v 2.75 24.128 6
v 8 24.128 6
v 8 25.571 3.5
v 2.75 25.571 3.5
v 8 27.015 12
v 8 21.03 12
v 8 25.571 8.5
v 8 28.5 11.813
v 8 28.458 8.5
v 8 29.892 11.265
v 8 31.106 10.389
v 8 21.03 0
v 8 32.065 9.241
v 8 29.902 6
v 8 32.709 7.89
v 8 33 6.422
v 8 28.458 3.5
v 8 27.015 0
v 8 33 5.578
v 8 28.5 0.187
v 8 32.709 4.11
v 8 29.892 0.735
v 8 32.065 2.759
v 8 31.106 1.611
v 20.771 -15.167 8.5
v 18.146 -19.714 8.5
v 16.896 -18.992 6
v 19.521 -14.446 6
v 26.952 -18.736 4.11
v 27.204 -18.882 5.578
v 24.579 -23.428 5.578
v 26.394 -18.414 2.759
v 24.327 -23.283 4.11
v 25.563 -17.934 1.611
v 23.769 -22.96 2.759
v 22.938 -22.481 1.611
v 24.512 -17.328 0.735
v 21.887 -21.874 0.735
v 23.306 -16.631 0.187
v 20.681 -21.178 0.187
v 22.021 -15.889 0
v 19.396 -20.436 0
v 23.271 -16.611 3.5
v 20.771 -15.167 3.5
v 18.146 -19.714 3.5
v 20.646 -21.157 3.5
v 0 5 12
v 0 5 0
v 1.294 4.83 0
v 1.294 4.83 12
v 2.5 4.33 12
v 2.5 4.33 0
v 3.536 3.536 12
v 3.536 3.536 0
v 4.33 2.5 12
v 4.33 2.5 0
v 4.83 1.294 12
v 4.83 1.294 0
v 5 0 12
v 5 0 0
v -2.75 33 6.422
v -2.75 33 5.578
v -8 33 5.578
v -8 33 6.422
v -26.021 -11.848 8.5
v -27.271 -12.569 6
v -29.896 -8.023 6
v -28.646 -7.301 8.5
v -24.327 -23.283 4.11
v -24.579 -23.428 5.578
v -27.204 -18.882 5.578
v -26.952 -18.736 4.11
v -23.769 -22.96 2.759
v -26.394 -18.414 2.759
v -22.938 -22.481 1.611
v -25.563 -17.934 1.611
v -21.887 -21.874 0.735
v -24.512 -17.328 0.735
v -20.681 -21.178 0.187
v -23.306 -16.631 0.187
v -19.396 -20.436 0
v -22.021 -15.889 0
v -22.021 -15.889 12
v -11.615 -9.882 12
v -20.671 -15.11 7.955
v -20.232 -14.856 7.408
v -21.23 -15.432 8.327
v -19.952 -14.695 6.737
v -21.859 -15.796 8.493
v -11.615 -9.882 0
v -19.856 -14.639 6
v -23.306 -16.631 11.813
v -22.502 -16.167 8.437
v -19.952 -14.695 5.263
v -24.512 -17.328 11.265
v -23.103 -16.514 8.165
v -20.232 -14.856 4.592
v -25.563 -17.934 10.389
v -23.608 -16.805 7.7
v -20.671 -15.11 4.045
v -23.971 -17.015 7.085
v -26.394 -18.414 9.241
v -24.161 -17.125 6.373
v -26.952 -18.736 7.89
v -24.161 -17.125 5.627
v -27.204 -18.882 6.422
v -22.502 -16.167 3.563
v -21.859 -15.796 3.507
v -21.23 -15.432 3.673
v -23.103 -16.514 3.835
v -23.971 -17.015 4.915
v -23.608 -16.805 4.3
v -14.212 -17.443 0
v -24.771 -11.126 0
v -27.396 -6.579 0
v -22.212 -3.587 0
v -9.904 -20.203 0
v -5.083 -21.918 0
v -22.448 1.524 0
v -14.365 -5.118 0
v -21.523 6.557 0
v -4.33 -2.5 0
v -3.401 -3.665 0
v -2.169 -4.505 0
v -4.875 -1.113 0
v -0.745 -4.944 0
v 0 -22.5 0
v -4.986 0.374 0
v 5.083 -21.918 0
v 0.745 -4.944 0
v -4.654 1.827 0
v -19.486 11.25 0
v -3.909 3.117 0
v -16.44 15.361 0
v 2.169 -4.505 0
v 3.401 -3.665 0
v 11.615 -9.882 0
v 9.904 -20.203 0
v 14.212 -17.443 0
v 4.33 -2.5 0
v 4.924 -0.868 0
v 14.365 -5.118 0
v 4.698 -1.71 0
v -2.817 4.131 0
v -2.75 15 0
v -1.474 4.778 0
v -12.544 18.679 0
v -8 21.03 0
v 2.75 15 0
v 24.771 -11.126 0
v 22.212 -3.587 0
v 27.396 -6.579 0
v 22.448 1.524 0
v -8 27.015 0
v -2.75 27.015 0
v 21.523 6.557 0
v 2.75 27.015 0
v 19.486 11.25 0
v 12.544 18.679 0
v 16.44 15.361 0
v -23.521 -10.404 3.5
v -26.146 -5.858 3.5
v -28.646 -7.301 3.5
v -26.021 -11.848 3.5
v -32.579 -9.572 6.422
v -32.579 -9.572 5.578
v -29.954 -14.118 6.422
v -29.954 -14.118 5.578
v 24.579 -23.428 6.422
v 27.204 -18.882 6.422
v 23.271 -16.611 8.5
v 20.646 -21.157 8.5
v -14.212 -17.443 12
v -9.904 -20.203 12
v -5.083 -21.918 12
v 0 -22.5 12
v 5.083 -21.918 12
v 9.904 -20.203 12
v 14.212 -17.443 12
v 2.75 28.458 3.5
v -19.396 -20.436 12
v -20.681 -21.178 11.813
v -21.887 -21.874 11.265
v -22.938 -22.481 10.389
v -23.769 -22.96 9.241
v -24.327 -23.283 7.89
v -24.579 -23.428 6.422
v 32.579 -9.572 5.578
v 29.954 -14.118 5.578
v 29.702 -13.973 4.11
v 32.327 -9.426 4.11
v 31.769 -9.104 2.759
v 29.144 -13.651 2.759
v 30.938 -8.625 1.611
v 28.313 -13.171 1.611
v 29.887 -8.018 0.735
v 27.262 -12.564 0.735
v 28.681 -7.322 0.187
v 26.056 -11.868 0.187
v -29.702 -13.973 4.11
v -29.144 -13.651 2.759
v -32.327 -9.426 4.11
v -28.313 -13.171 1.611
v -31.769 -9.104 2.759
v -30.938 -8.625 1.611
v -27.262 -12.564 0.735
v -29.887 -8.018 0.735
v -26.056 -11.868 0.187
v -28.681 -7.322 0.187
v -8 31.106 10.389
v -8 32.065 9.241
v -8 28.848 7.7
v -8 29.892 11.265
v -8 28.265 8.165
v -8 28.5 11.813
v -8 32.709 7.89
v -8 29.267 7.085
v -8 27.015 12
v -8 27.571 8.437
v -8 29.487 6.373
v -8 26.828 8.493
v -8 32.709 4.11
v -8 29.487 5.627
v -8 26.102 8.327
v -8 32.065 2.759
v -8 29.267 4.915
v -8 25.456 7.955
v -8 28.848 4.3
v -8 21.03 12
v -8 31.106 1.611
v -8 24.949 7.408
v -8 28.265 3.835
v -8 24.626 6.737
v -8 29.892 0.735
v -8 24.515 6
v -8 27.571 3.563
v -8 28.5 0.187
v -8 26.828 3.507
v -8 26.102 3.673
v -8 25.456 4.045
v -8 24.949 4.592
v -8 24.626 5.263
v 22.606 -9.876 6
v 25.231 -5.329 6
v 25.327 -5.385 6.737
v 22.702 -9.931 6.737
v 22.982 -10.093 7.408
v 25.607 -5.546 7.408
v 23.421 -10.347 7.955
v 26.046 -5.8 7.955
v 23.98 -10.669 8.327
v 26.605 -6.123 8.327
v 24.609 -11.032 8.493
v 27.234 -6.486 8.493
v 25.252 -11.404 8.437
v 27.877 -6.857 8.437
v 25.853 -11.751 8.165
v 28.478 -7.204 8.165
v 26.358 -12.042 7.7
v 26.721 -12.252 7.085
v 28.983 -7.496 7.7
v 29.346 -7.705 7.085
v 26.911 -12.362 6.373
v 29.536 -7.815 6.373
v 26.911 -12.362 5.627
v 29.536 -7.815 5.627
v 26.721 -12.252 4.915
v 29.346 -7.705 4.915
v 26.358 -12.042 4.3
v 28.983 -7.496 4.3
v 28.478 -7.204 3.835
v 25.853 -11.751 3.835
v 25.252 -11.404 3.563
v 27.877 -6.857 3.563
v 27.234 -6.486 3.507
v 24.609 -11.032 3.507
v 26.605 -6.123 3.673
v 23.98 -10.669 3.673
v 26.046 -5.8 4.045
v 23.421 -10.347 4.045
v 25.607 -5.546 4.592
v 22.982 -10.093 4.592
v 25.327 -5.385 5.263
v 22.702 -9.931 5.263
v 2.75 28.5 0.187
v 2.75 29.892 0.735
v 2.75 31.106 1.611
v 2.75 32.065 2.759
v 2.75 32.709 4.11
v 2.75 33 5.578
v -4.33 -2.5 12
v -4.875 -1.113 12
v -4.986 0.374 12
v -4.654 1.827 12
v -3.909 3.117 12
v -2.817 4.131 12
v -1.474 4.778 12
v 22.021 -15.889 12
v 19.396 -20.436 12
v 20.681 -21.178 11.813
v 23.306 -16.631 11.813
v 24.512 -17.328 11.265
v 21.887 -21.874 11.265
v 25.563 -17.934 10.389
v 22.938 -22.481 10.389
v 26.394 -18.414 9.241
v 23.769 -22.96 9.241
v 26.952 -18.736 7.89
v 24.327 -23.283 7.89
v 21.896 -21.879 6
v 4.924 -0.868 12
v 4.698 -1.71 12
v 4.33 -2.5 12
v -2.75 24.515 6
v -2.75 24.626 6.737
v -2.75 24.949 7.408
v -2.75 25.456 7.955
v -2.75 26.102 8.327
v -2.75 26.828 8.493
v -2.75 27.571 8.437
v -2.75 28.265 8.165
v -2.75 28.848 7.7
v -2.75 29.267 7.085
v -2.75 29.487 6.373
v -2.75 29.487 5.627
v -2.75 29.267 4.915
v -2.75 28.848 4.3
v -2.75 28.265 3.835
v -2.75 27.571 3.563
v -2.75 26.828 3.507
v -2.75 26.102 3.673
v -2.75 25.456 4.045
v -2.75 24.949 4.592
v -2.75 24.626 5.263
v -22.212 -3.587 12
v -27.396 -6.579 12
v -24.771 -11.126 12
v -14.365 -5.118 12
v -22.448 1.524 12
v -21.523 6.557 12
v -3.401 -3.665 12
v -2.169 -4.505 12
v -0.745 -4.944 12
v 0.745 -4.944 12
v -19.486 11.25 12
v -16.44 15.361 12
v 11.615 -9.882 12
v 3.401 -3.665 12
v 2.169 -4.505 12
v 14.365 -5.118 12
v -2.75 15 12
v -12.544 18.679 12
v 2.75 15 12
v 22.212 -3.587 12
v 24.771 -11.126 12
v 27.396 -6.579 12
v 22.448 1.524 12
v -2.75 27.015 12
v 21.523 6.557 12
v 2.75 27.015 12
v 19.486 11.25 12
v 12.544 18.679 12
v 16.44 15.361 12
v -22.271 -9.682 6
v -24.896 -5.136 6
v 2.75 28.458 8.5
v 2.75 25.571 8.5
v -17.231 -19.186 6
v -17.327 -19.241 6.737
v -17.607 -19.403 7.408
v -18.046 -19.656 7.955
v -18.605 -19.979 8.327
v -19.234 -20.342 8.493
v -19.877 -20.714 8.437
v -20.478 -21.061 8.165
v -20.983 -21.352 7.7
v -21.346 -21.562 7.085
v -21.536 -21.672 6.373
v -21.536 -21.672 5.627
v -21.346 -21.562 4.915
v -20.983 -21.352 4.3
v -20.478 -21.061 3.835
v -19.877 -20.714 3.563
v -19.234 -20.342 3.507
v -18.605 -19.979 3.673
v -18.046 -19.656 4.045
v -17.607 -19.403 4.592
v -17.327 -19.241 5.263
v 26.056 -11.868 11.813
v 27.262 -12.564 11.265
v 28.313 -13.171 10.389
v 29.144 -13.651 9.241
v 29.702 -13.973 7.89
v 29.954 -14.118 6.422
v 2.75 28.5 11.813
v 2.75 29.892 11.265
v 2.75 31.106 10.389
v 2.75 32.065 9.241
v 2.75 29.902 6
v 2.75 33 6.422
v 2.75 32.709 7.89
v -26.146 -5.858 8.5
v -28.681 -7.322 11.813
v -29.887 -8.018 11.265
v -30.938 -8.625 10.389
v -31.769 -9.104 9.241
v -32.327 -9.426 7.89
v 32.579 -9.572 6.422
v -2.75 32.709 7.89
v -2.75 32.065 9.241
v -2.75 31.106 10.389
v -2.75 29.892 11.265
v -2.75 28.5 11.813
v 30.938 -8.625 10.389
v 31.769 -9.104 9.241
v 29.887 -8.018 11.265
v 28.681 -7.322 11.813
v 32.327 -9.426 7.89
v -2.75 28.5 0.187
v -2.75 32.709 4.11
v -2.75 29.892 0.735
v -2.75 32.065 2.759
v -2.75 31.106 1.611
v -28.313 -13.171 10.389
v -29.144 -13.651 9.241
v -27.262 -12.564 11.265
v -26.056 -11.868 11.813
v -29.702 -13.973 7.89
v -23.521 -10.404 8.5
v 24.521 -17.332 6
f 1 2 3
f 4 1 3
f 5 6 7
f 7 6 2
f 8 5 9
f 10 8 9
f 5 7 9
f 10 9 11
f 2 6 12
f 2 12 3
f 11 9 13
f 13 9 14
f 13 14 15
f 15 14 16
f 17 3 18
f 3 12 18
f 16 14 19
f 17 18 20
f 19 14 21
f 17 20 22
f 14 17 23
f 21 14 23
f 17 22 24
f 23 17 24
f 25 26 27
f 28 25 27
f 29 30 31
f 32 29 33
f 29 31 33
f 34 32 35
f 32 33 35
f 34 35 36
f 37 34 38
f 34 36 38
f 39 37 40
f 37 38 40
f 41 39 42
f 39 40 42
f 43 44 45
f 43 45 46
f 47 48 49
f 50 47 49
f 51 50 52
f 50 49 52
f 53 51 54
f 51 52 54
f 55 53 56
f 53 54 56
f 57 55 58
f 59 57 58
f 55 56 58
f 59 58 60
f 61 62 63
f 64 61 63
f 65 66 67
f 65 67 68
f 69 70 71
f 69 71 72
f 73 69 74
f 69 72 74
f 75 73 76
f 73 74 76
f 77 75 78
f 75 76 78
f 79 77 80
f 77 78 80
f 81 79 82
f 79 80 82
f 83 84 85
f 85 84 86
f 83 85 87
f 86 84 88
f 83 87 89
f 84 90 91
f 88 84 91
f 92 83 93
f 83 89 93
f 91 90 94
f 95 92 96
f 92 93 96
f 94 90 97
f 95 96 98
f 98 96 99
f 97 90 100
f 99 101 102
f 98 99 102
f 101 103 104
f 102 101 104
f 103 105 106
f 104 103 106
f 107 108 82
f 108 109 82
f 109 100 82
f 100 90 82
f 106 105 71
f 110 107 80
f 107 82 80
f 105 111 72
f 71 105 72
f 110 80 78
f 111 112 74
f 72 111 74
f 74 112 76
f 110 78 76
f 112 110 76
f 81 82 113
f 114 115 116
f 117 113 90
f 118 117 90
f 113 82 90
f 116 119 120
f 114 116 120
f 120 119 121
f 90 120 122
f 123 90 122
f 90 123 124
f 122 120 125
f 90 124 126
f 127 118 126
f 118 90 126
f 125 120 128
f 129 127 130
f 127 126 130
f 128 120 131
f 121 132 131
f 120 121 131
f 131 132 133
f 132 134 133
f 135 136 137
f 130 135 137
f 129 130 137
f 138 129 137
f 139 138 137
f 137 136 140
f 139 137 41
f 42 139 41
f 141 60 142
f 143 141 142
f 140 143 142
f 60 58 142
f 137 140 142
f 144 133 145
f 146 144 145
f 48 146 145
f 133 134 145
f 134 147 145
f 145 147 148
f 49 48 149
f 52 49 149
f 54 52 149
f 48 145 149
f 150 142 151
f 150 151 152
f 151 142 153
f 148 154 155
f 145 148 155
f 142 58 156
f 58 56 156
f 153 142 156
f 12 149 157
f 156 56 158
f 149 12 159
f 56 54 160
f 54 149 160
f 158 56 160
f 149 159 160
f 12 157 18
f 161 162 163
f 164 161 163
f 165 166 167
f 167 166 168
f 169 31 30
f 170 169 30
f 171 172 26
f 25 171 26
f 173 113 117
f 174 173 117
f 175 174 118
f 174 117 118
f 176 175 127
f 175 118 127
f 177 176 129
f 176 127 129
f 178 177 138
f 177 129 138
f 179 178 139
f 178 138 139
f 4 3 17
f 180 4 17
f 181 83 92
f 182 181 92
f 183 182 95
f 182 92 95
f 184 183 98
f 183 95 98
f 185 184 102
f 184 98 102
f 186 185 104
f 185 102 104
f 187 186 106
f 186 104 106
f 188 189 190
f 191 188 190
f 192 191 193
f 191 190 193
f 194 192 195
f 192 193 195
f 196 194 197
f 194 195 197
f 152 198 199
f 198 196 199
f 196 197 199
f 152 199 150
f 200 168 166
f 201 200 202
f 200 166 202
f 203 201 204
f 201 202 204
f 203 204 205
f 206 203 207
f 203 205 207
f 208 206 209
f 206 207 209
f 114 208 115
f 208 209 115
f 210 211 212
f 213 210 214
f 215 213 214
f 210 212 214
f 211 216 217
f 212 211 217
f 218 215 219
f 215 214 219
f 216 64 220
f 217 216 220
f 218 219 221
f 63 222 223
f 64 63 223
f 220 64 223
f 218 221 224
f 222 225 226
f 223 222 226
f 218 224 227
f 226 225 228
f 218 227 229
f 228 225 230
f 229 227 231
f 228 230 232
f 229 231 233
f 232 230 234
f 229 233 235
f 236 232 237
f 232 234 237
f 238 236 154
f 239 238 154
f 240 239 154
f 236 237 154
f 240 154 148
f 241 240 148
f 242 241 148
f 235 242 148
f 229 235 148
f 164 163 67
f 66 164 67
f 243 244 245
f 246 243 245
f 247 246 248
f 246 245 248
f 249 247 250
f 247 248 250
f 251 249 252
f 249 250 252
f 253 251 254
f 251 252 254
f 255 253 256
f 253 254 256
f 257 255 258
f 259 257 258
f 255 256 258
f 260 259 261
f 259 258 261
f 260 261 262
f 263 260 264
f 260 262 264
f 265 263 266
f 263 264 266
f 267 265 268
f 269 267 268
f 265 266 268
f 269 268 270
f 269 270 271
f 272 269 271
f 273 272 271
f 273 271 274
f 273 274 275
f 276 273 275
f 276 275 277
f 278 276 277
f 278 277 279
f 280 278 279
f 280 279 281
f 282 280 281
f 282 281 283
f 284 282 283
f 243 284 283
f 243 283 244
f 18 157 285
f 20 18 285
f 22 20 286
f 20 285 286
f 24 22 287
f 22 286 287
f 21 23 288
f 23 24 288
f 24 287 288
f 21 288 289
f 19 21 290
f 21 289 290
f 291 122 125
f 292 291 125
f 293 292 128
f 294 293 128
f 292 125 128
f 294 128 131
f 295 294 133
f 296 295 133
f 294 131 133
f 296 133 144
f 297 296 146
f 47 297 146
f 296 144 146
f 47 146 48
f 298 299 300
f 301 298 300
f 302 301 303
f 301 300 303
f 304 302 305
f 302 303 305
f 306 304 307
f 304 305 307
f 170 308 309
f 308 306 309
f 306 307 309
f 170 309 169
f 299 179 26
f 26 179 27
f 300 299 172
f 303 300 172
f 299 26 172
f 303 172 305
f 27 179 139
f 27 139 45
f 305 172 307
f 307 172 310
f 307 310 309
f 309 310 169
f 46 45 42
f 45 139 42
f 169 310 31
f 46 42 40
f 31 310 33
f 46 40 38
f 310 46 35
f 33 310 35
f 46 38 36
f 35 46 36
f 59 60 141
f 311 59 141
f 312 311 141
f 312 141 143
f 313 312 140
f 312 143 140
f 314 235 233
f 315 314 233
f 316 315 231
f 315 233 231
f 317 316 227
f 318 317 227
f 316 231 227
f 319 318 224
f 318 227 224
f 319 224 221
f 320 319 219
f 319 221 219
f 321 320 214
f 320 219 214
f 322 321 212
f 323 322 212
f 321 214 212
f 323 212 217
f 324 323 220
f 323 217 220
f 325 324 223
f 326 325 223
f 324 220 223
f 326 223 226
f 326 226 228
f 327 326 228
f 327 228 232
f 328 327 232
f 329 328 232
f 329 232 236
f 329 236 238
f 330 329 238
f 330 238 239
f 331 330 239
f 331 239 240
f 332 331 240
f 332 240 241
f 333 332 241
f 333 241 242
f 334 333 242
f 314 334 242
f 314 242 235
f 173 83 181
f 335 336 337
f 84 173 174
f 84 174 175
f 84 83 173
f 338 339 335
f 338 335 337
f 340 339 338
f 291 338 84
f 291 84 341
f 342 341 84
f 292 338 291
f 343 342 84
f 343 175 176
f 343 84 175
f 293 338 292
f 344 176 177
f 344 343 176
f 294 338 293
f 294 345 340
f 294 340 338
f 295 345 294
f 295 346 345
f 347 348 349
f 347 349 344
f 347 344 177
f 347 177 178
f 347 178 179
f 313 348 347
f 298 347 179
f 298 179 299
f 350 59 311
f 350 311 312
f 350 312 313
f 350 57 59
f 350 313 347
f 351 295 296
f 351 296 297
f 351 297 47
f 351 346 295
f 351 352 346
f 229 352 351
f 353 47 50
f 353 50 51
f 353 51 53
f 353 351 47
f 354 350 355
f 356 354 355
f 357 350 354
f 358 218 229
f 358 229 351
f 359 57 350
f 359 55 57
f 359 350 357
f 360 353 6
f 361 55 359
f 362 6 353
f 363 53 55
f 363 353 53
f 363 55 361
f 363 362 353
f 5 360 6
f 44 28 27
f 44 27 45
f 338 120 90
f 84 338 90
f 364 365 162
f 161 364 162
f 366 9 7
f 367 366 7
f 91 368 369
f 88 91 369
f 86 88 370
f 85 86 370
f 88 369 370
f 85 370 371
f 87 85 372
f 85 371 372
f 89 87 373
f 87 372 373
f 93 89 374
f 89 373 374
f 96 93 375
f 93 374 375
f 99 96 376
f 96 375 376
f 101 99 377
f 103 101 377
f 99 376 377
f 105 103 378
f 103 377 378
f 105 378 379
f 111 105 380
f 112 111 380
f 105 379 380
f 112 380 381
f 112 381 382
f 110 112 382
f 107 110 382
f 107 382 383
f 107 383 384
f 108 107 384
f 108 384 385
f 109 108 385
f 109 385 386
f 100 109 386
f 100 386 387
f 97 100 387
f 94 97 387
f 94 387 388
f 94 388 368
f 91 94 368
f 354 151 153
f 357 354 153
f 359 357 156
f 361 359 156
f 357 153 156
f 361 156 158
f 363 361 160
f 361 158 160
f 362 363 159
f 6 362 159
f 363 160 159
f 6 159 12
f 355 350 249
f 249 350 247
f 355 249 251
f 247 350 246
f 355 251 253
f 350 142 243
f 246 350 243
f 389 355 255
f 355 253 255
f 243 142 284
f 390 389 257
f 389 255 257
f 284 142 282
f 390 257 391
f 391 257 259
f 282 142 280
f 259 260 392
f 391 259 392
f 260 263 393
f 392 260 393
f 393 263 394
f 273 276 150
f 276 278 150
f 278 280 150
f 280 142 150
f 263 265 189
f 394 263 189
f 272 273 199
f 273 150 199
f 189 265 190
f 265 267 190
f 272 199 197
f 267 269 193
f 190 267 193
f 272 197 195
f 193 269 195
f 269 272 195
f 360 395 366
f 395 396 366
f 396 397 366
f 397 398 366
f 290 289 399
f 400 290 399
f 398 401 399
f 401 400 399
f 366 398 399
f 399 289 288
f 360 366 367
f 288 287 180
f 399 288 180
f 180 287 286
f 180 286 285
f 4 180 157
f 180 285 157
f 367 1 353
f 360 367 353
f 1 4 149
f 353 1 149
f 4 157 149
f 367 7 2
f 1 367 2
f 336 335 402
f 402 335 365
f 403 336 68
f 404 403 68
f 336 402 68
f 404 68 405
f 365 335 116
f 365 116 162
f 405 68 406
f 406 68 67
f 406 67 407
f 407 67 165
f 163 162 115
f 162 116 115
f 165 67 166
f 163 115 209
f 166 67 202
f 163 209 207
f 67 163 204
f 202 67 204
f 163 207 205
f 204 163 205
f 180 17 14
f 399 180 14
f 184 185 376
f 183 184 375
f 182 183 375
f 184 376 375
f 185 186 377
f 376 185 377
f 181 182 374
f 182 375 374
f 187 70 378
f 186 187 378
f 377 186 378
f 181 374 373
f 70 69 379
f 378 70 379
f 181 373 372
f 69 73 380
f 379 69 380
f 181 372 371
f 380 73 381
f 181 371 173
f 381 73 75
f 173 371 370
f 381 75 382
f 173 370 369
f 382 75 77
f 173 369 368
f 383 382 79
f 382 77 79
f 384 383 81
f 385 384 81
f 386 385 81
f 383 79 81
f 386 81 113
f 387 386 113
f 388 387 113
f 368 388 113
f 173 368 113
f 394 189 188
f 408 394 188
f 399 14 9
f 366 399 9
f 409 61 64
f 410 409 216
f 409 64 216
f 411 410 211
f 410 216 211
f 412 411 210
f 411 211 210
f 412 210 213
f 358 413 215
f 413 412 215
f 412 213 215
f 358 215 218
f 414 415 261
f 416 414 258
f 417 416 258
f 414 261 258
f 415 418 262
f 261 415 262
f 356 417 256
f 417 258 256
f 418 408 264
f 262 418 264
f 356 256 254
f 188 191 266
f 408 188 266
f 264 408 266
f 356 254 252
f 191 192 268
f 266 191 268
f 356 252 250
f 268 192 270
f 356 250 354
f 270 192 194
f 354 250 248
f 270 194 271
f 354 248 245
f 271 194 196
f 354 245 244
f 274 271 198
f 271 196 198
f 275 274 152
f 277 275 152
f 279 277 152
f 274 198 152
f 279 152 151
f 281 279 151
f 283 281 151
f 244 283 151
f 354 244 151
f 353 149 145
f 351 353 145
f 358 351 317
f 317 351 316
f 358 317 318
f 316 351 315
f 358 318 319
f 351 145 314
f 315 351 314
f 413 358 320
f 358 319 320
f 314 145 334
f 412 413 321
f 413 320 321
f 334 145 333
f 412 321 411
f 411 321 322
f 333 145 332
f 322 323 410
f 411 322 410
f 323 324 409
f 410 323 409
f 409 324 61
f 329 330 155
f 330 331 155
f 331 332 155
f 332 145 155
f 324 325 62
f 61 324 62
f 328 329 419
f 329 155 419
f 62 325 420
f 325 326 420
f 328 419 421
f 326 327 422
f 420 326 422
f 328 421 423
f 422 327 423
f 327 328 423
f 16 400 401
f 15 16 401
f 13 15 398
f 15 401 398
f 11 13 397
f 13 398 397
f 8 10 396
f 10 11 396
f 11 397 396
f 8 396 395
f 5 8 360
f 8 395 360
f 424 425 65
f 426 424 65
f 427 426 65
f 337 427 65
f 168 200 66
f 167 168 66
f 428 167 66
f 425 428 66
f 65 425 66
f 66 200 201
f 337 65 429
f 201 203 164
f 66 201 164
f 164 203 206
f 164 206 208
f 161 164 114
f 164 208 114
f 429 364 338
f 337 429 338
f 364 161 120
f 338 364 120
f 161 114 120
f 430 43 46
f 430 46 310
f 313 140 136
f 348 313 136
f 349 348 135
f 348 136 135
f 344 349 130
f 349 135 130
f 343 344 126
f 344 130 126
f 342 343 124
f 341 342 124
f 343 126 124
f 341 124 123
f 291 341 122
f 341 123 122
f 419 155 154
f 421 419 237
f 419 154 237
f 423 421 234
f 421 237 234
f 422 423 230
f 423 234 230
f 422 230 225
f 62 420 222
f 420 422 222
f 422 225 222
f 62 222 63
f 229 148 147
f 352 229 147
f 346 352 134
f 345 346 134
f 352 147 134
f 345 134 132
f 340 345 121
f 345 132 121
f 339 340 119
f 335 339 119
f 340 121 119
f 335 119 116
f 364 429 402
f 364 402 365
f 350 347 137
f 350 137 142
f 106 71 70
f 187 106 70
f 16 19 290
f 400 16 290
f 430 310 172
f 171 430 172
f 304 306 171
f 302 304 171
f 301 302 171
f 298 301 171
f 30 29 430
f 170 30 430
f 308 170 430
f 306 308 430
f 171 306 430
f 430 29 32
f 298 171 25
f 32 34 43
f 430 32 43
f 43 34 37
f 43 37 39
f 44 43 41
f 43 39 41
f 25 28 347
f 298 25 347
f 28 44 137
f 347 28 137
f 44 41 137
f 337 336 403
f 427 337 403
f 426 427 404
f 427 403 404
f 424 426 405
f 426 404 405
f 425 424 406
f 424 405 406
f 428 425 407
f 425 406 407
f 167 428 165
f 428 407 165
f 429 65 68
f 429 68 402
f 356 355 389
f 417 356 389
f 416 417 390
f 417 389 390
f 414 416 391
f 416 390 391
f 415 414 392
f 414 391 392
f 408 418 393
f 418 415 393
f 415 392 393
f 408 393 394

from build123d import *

# Parameters (mm, degrees)
F1_DEPTH  = 12
F3_DEPTH  = 25
F5_DEPTH  = 25
F7_DEPTH  = 25
F8_R      = 2.5
F9_DEPTH  = 5.6
F11_DEPTH = 7
F12_R     = 2.5
F13_DEPTH = 7
F15_DEPTH = 7
F16_R     = 2.5
F17_DEPTH = 7
F19_DEPTH = 7


with BuildPart() as f1:
    # F0 (on Top) → F1 (new body)
    with BuildSketch(Plane.XY):
        with BuildLine():
            ThreePointArc((0, 5), (3.5355339059, 3.5355339059), (5, 0))
            ThreePointArc((5, 0), (4.8296291314, -1.2940952255), (4.3301270189, -2.5))
            Line((4.3301270189, -2.5), (12.9903810568, -7.5))
            Line((12.9903810568, -7.5), (14.3653810568, -5.1184301396))
            Line((14.3653810568, -5.1184301396), (29.9538383249, -14.1184301396))
            Line((29.9538383249, -14.1184301396), (32.5788383249, -9.5717967697))
            Line((32.5788383249, -9.5717967697), (22.2122898066, -3.5866671921))
            ThreePointArc((22.2122898066, -3.5866671921), (19.4855715851, 11.25), (8, 21.0297408448))
            Line((8, 21.0297408448), (8, 33))
            Line((8, 33), (2.75, 33))
            Line((2.75, 33), (2.75, 15))
            Line((2.75, 15), (0, 15))
            Line((0, 15), (0, 5))
        make_face()
        with BuildLine():
            ThreePointArc((-4.3301270189, -2.5), (-4.3301270189, 2.5), (0, 5))
            Line((0, 5), (0, 15))
            Line((0, 15), (-2.75, 15))
            Line((-2.75, 15), (-2.75, 33))
            Line((-2.75, 33), (-8, 33))
            Line((-8, 33), (-8, 21.0297408448))
            ThreePointArc((-8, 21.0297408448), (-19.4855715851, 11.25), (-22.2122898066, -3.5866671921))
            Line((-22.2122898066, -3.5866671921), (-32.5788383249, -9.5717967697))
            Line((-32.5788383249, -9.5717967697), (-29.9538383249, -14.1184301396))
            Line((-29.9538383249, -14.1184301396), (-14.3653810568, -5.1184301396))
            Line((-14.3653810568, -5.1184301396), (-12.9903810568, -7.5))
            Line((-12.9903810568, -7.5), (-4.3301270189, -2.5))
        make_face()
        with BuildLine():
            Line((12.9903810568, -7.5), (4.3301270189, -2.5))
            ThreePointArc((4.3301270189, -2.5), (0, -5), (-4.3301270189, -2.5))
            Line((-4.3301270189, -2.5), (-12.9903810568, -7.5))
            Line((-12.9903810568, -7.5), (-11.6153810568, -9.8815698604))
            Line((-11.6153810568, -9.8815698604), (-27.2038383249, -18.8815698604))
            Line((-27.2038383249, -18.8815698604), (-24.5788383249, -23.4282032303))
            Line((-24.5788383249, -23.4282032303), (-14.2122898066, -17.4430736527))
            ThreePointArc((-14.2122898066, -17.4430736527), (0, -22.5), (14.2122898066, -17.4430736527))
            Line((14.2122898066, -17.4430736527), (24.5788383249, -23.4282032303))
            Line((24.5788383249, -23.4282032303), (27.2038383249, -18.8815698604))
            Line((27.2038383249, -18.8815698604), (11.6153810568, -9.8815698604))
            Line((11.6153810568, -9.8815698604), (12.9903810568, -7.5))
        make_face()
    extrude(amount=F1_DEPTH)

    # F2 (on face) → F3 (cut)
    with BuildSketch(Plane(origin=(-8, 0, 0), x_dir=(0, -1, 0), z_dir=(-1, 0, 0))):
        with BuildLine():
            ThreePointArc((-27.0148704224, 0), (-31.1055308437, 1.6106381651), (-33, 5.5778342276))
            Line((-33, 5.5778342276), (-33, 0))
            Line((-33, 0), (-27.0148704224, 0))
        make_face()
        with BuildLine():
            Line((-33, 5.5778342276), (-33, 6.4221657724))
            ThreePointArc((-33, 6.4221657724), (-33.0148704224, 6), (-33, 5.5778342276))
        make_face()
        with BuildLine():
            ThreePointArc((-33, 6.4221657724), (-31.1055308437, 10.3893618349), (-27.0148704224, 12))
            Line((-27.0148704224, 12), (-33, 12))
            Line((-33, 12), (-33, 6.4221657724))
        make_face()
    extrude(amount=-F3_DEPTH, mode=Mode.SUBTRACT)

    # F4 (on face) → F5 (cut)
    with BuildSketch(Plane(origin=(-4, 6.9282032303, 0), x_dir=(-0.8660254038, -0.5, 0), z_dir=(-0.5, 0.8660254038, 0))):
        with BuildLine():
            Line((33, 12), (27.0148704224, 12))
            ThreePointArc((27.0148704224, 12), (31.1055308437, 10.3893618349), (33, 6.4221657724))
            Line((33, 6.4221657724), (33, 12))
        make_face()
        with BuildLine():
            Line((33, 0), (33, 5.5778342276))
            ThreePointArc((33, 5.5778342276), (31.1055308437, 1.6106381651), (27.0148704224, 0))
            Line((27.0148704224, 0), (33, 0))
        make_face()
        with BuildLine():
            ThreePointArc((33, 5.5778342276), (33.0148704224, 6), (33, 6.4221657724))
            Line((33, 6.4221657724), (33, 5.5778342276))
        make_face()
    extrude(amount=-F5_DEPTH, mode=Mode.SUBTRACT)

    # F6 (on face) → F7 (cut)
    with BuildSketch(Plane(origin=(-4, -6.9282032303, 0), x_dir=(0.8660254038, -0.5, 0), z_dir=(-0.5, -0.8660254038, 0))):
        with BuildLine():
            Line((33, 12), (27.0148704224, 12))
            ThreePointArc((27.0148704224, 12), (31.1055308437, 10.3893618349), (33, 6.4221657724))
            Line((33, 6.4221657724), (33, 12))
        make_face()
        with BuildLine():
            Line((33, 0), (33, 5.5778342276))
            ThreePointArc((33, 5.5778342276), (31.1055308437, 1.6106381651), (27.0148704224, 0))
            Line((27.0148704224, 0), (33, 0))
        make_face()
        with BuildLine():
            ThreePointArc((33, 5.5778342276), (33.0148704224, 6), (33, 6.4221657724))
            Line((33, 6.4221657724), (33, 5.5778342276))
        make_face()
    extrude(amount=-F7_DEPTH, mode=Mode.SUBTRACT)

    # F8 (on face) → F9 (cut)
    with BuildSketch(Plane(origin=(4, -6.9282032303, 0), x_dir=(0.8660254038, 0.5, 0), z_dir=(0.5, -0.8660254038, 0))):
        with Locations((-27.0148704224, 6)):
            Circle(F8_R)
    extrude(amount=-F9_DEPTH, mode=Mode.SUBTRACT)

    # F10 (on face) → F11 (cut)
    with BuildSketch(Plane(origin=(-4, 6.9282032303, 0), x_dir=(-0.8660254038, -0.5, 0), z_dir=(-0.5, 0.8660254038, 0))):
        Polygon((28.4582460954, 8.5), (25.5714947494, 8.5), (24.1281190765, 6), (25.5714947494, 3.5), (28.4582460954, 3.5), (29.9016217684, 6), align=None)
    extrude(amount=-F11_DEPTH, mode=Mode.SUBTRACT)

    # F12 (on face) → F13 (cut)
    with BuildSketch(Plane(origin=(-8, 0, 0), x_dir=(0, -1, 0), z_dir=(-1, 0, 0))):
        with Locations((-27.0148704224, 6)):
            Circle(F12_R)
    extrude(amount=-F13_DEPTH, mode=Mode.SUBTRACT)

    # F14 (on face) → F15 (cut)
    with BuildSketch(Plane.YZ.offset(8)):
        Polygon((28.4582460954, 8.5), (25.5714947494, 8.5), (24.1281190765, 6), (25.5714947494, 3.5), (28.4582460954, 3.5), (29.9016217684, 6), align=None)
    extrude(amount=-F15_DEPTH, mode=Mode.SUBTRACT)

    # F16 (on face) → F17 (cut)
    with BuildSketch(Plane(origin=(4, 6.9282032303, 0), x_dir=(-0.8660254038, 0.5, 0), z_dir=(0.5, 0.8660254038, 0))):
        with Locations((-27.0148704224, 6)):
            Circle(F16_R)
    extrude(amount=-F17_DEPTH, mode=Mode.SUBTRACT)

    # F18 (on face) → F19 (cut)
    with BuildSketch(Plane(origin=(-4, -6.9282032303, 0), x_dir=(0.8660254038, -0.5, 0), z_dir=(-0.5, -0.8660254038, 0))):
        Polygon((28.4582460954, 8.5), (25.5714947494, 8.5), (24.1281190765, 6), (25.5714947494, 3.5), (28.4582460954, 3.5), (29.9016217684, 6), align=None)
    extrude(amount=-F19_DEPTH, mode=Mode.SUBTRACT)


solid = f1.part
